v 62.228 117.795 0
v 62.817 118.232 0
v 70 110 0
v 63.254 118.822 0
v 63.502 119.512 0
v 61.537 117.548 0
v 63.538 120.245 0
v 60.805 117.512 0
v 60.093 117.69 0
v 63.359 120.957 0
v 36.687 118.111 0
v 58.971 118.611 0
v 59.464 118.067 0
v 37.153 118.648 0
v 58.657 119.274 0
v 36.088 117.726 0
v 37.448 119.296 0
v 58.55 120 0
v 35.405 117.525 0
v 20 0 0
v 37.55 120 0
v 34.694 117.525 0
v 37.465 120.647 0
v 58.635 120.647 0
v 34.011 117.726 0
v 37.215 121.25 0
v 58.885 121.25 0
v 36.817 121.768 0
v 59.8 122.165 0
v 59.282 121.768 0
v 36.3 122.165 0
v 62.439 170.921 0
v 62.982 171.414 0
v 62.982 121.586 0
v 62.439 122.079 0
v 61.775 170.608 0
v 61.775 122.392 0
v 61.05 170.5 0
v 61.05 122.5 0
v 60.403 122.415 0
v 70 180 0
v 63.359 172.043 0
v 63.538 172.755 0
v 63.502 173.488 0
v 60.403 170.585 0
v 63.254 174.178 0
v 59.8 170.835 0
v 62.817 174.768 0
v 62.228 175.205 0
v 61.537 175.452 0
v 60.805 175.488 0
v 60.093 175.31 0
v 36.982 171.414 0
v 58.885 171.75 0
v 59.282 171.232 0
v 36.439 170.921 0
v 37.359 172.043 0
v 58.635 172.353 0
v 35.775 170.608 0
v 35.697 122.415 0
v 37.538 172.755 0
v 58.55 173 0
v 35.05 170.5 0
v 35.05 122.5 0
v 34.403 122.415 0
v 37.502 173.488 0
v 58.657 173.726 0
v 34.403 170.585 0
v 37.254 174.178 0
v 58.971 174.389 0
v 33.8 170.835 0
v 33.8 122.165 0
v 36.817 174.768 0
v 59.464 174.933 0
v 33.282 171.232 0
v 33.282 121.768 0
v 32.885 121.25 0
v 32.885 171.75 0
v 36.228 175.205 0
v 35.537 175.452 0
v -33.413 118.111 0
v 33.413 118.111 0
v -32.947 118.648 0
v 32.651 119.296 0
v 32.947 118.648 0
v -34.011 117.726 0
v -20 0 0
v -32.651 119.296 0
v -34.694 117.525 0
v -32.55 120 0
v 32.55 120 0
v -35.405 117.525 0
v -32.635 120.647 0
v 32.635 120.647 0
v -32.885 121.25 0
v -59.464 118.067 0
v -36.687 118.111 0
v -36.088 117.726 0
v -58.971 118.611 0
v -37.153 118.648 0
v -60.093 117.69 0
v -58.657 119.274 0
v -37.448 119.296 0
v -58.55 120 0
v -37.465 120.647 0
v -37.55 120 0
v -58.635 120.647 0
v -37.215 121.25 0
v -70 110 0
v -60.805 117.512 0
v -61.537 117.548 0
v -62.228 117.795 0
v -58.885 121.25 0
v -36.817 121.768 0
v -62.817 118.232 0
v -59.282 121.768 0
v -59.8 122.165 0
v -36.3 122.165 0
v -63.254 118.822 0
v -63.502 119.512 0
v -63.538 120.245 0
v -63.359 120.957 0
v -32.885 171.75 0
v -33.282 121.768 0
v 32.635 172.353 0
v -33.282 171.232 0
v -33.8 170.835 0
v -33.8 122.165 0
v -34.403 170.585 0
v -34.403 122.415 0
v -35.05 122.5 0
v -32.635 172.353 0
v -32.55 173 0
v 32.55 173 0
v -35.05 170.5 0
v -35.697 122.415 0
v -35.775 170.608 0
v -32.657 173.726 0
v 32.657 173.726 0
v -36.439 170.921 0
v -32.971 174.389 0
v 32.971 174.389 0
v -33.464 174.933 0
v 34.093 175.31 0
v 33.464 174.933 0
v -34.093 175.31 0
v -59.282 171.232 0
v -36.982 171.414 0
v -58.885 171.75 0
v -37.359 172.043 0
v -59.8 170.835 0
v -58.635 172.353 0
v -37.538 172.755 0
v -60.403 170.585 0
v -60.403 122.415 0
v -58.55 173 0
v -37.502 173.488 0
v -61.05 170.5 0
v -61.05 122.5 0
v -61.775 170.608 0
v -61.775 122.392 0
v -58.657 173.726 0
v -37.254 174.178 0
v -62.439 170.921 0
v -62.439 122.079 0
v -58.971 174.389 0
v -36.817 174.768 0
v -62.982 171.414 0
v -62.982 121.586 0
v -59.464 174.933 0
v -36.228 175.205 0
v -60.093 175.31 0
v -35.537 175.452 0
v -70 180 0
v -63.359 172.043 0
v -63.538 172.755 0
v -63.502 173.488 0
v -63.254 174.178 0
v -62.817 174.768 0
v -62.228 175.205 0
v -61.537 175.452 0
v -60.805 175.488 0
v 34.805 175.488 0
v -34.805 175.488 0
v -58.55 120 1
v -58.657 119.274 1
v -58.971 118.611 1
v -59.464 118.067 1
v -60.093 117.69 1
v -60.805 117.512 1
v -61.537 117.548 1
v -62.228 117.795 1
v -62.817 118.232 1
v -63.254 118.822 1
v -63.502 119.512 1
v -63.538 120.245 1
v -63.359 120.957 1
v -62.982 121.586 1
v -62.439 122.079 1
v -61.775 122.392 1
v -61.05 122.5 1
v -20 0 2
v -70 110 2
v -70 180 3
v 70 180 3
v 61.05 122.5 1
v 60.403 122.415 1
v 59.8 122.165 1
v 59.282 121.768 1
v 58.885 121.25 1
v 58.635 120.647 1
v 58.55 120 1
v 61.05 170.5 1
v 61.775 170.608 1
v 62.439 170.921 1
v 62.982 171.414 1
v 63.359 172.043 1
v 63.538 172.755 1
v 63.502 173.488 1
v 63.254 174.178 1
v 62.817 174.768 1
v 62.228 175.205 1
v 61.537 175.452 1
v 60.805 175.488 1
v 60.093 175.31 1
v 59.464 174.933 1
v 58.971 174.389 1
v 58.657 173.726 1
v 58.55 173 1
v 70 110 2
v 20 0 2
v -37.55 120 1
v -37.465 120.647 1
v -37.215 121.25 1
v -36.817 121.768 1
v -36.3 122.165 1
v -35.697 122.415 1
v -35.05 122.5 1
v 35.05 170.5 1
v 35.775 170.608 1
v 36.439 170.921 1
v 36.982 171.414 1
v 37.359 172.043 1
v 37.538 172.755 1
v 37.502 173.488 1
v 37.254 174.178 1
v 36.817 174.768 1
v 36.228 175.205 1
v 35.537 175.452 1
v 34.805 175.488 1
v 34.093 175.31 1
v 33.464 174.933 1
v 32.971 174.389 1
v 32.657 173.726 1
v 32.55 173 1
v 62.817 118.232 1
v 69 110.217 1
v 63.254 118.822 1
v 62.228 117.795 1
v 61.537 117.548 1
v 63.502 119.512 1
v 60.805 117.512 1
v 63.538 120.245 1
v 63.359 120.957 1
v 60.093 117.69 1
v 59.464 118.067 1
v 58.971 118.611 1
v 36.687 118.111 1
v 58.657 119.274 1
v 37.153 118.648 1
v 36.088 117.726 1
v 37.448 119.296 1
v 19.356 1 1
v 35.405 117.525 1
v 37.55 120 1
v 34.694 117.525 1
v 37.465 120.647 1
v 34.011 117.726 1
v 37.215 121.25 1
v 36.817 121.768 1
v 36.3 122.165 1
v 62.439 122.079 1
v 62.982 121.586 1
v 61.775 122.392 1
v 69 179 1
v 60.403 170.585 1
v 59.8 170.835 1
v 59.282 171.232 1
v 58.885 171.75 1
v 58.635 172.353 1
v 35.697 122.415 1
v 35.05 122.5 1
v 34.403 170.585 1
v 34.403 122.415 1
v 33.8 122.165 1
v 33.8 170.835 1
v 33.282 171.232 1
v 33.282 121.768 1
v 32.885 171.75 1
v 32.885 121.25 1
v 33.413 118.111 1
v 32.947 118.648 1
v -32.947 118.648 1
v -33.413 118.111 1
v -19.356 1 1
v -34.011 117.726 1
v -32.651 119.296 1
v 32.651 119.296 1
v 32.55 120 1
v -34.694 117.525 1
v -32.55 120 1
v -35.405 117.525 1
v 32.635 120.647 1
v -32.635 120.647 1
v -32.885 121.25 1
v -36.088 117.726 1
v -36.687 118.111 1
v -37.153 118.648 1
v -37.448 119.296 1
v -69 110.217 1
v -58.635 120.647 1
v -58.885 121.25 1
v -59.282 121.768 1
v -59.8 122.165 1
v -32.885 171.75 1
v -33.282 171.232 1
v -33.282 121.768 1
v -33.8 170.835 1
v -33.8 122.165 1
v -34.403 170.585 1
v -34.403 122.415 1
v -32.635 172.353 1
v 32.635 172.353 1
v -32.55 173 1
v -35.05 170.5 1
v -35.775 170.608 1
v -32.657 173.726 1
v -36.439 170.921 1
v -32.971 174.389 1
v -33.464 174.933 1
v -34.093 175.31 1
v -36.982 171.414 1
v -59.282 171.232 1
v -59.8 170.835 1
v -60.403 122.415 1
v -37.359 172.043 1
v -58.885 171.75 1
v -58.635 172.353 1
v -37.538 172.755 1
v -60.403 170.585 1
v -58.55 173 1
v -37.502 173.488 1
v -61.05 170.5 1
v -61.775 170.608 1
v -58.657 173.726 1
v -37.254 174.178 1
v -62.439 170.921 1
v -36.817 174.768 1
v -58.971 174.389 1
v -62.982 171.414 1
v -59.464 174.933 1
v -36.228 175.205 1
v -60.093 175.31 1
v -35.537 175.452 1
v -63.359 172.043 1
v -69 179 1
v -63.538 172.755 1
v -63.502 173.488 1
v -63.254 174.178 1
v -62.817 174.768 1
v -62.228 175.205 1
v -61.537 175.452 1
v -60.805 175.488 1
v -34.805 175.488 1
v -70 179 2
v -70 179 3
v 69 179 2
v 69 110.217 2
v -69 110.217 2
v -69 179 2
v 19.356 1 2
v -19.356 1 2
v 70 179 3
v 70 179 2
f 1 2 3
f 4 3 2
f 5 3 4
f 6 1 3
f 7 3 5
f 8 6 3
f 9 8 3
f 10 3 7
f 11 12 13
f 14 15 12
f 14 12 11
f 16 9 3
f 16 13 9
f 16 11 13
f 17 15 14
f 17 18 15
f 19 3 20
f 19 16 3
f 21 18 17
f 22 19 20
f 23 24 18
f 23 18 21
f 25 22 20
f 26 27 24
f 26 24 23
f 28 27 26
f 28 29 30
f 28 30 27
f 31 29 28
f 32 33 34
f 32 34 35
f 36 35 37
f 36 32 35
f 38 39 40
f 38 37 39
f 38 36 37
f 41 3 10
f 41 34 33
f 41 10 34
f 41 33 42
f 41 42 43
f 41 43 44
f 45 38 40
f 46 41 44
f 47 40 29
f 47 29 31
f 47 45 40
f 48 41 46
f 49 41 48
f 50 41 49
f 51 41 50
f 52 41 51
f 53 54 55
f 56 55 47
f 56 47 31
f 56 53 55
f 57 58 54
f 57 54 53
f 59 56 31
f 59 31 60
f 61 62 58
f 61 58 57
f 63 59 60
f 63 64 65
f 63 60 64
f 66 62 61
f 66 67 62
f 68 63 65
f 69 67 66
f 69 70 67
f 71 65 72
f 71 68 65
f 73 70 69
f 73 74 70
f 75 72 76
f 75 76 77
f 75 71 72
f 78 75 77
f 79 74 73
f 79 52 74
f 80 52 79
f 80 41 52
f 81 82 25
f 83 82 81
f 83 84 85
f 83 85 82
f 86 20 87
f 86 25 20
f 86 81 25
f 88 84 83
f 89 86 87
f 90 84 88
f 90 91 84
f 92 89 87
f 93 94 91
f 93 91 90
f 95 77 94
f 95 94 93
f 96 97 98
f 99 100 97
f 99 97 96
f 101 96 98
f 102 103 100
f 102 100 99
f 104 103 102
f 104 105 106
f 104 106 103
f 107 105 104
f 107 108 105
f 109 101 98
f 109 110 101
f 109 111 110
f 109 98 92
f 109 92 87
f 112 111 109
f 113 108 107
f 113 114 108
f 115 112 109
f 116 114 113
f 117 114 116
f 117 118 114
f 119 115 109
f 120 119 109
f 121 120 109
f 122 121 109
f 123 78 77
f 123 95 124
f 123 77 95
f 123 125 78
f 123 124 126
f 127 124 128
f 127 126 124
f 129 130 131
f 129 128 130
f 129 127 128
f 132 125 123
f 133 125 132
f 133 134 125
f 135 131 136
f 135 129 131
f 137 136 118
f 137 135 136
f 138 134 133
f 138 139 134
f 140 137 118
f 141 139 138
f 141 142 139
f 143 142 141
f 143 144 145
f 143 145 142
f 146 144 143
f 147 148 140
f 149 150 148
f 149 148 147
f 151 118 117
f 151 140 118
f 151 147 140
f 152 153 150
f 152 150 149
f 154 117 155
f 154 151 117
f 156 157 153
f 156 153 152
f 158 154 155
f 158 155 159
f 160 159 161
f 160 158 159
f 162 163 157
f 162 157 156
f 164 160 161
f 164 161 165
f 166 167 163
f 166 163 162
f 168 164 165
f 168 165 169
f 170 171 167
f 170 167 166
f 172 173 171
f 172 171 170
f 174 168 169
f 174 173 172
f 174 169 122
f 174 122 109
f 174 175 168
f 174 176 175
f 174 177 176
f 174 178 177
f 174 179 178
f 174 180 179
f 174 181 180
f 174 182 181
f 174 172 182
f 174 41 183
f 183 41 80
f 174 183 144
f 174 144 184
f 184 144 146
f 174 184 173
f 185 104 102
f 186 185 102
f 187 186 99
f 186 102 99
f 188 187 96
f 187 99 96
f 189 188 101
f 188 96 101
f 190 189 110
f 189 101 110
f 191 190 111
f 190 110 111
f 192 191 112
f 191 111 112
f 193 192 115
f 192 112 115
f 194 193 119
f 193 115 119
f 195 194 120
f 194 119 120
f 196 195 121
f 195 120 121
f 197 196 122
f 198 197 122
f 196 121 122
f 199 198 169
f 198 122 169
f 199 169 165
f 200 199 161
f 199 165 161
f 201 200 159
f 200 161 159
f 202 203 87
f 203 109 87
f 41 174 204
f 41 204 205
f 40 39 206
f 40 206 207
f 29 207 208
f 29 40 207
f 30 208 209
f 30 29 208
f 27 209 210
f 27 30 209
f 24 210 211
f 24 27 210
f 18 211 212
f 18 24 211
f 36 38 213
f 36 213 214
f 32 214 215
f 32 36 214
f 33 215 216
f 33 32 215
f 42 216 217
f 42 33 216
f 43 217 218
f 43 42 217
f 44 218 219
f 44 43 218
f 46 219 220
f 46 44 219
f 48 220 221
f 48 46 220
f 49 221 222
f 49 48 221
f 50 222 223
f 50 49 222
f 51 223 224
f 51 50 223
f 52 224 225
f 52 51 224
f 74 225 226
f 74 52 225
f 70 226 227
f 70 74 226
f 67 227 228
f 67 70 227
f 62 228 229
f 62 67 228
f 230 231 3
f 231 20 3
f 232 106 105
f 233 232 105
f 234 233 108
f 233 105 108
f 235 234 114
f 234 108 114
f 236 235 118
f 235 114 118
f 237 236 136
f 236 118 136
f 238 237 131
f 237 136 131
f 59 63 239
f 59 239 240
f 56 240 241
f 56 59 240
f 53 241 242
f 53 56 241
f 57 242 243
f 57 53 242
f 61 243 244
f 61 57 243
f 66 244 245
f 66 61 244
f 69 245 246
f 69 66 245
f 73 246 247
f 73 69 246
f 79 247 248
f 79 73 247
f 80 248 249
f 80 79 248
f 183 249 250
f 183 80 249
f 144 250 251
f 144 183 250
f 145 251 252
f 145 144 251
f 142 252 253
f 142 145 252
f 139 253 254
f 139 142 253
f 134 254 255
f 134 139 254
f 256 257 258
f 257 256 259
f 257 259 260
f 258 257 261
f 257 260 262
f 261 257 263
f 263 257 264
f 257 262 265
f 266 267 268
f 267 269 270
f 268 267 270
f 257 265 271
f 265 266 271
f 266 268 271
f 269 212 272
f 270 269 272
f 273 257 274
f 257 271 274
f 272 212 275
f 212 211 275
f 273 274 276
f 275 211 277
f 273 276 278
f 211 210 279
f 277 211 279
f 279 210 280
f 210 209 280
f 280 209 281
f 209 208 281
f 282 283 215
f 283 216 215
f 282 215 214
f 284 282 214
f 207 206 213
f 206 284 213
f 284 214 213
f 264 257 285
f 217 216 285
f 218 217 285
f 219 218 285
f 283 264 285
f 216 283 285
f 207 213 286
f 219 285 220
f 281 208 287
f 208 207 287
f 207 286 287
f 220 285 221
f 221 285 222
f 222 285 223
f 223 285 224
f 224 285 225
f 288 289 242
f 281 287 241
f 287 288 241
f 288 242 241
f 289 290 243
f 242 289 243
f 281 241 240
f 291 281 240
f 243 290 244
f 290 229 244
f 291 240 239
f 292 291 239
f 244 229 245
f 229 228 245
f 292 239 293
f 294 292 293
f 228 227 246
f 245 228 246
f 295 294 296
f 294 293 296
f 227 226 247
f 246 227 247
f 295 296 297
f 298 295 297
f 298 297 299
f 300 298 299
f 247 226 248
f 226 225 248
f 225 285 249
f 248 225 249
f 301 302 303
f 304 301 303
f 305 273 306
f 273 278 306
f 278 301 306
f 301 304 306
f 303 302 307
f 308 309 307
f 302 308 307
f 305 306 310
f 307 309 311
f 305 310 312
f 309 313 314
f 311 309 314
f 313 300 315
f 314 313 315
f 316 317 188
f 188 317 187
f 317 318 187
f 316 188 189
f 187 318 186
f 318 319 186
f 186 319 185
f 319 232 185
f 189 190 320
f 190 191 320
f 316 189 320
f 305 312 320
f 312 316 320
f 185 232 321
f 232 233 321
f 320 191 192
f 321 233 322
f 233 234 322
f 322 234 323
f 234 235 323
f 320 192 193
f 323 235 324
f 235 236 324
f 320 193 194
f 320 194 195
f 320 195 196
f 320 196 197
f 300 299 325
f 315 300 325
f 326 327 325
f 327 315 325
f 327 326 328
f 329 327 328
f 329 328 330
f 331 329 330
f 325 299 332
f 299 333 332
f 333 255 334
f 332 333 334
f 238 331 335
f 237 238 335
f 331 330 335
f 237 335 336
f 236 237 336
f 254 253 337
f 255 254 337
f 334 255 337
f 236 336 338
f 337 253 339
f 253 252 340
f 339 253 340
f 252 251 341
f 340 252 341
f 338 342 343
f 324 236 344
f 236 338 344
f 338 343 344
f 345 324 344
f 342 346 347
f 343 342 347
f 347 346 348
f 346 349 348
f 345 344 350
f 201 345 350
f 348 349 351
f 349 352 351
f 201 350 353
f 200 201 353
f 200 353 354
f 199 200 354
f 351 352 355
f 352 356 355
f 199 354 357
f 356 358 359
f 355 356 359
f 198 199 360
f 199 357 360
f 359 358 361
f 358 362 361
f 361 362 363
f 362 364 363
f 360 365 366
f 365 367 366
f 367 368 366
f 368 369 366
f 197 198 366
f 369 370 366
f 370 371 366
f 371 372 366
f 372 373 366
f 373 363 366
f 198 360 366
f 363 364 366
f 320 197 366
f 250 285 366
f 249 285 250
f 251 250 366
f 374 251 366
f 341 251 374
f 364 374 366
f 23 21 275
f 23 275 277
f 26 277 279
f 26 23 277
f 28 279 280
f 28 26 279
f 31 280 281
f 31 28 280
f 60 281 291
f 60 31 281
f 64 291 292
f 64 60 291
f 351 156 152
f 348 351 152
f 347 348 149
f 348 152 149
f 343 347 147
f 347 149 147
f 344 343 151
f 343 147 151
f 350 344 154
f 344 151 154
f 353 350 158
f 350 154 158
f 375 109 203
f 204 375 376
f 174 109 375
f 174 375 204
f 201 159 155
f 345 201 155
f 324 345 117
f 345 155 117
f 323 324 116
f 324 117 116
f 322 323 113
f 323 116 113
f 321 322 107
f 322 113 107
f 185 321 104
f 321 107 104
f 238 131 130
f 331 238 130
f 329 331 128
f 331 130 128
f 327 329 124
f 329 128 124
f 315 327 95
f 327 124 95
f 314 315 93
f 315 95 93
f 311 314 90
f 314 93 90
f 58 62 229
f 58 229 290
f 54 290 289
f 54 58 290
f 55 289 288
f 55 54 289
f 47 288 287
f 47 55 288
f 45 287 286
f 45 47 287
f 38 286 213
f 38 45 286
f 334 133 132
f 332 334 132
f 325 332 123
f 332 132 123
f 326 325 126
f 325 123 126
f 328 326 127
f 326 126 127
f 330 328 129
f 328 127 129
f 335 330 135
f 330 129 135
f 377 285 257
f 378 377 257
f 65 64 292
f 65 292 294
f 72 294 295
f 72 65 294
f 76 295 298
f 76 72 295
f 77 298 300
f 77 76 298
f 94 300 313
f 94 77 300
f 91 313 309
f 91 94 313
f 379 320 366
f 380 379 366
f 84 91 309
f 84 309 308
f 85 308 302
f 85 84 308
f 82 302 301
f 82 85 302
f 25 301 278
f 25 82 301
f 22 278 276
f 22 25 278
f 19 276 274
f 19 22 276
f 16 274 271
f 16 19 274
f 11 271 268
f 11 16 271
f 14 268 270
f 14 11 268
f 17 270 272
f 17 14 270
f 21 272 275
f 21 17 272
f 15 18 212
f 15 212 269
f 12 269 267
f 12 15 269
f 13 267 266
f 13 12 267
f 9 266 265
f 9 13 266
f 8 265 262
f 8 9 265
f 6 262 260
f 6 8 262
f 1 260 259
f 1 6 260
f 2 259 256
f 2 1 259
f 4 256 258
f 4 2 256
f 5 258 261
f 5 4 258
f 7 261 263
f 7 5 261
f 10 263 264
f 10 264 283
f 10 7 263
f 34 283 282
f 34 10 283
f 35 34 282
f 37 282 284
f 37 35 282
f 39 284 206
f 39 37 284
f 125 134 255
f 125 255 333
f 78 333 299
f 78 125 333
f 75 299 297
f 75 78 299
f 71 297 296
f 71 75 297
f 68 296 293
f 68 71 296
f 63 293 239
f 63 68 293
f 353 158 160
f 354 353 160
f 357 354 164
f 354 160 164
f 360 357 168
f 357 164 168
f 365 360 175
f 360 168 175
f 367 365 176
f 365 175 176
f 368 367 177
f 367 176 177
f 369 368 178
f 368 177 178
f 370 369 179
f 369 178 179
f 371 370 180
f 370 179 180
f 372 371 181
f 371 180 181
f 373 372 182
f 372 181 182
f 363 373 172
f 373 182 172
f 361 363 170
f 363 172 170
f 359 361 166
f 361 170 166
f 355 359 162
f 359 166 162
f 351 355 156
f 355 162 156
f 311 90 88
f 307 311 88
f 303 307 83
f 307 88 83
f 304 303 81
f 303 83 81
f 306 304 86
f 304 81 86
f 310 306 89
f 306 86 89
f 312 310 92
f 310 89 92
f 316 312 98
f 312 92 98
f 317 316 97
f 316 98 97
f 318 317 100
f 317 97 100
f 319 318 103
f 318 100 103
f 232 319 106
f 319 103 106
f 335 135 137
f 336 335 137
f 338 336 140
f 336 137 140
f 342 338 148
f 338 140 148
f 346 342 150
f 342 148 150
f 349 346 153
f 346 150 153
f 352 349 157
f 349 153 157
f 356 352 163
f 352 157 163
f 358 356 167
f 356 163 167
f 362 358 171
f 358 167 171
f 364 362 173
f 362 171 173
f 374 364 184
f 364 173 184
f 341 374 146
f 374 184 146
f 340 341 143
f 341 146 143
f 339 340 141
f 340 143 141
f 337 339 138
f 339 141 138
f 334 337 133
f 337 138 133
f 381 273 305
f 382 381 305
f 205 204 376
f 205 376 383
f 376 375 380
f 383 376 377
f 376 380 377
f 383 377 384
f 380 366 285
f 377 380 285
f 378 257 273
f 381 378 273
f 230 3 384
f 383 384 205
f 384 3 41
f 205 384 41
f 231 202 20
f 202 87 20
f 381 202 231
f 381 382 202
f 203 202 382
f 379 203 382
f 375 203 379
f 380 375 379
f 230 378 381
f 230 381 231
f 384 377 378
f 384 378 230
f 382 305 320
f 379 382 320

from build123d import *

# Parameters (mm, degrees)
F1_DEPTH = 1
F3_W     = 140
F3_H     = 1
F4_DEPTH = 2
F6_DEPTH = 1


with BuildPart() as f1:
    # F0 (on Top) → F1 (new body)
    with BuildSketch(Plane.XY):
        Polygon((-20, 0), (0, 0), (0, 180), (-70, 180), (-70, 110), align=None)
        with BuildLine():
            ThreePointArc((-58.549692, 120), (-62.817459, 118.232233), (-61.049692, 122.5))
            ThreePointArc((-61.049692, 122.5), (-59.281925, 121.767767), (-58.549692, 120))
        make_face(mode=Mode.SUBTRACT)
        with BuildLine():
            ThreePointArc((-32.549692, 120), (-35.049692, 117.5), (-37.549692, 120))
            ThreePointArc((-37.549692, 120), (-36.817459, 121.767767), (-35.049692, 122.5))
            ThreePointArc((-35.049692, 122.5), (-33.281925, 121.767767), (-32.549692, 120))
        make_face(mode=Mode.SUBTRACT)
        with BuildLine():
            ThreePointArc((-61.049692, 170.5), (-62.817459, 174.767767), (-58.549692, 173))
            ThreePointArc((-58.549692, 173), (-59.281925, 171.232233), (-61.049692, 170.5))
        make_face(mode=Mode.SUBTRACT)
        with BuildLine():
            ThreePointArc((-32.549692, 173), (-33.281925, 171.232233), (-35.049692, 170.5))
            ThreePointArc((-35.049692, 170.5), (-36.817459, 174.767767), (-32.549692, 173))
        make_face(mode=Mode.SUBTRACT)
    extrude(amount=F1_DEPTH)

    # F2: F1 across face


with BuildPart() as f1_1:
    add(f1.part)
    add(f1.part.mirror(Plane(origin=(0, 90, 0.5), x_dir=(0, 1, 0), z_dir=(1, 0, 0))))

    # F3 (on face) → F4 (join)
    with BuildSketch(Plane.XY.offset(1)):
        with Locations((0, 179.5)):
            Rectangle(F3_W, F3_H)
    extrude(amount=F4_DEPTH)

    # F5 (on face) → F6 (join)
    with BuildSketch(Plane.XY.offset(1)):
        Polygon((-69, 110.216609), (-69, 179), (-70, 179), (-70, 110), (-20, 0), (-16.780434, 0), (16.780434, 0), (20, 0), (70, 110), (70, 179), (69, 179), (69, 110.216609), (19.356087, 1), (-19.356087, 1), align=None)
    extrude(amount=F6_DEPTH)


solid = f1_1.part
